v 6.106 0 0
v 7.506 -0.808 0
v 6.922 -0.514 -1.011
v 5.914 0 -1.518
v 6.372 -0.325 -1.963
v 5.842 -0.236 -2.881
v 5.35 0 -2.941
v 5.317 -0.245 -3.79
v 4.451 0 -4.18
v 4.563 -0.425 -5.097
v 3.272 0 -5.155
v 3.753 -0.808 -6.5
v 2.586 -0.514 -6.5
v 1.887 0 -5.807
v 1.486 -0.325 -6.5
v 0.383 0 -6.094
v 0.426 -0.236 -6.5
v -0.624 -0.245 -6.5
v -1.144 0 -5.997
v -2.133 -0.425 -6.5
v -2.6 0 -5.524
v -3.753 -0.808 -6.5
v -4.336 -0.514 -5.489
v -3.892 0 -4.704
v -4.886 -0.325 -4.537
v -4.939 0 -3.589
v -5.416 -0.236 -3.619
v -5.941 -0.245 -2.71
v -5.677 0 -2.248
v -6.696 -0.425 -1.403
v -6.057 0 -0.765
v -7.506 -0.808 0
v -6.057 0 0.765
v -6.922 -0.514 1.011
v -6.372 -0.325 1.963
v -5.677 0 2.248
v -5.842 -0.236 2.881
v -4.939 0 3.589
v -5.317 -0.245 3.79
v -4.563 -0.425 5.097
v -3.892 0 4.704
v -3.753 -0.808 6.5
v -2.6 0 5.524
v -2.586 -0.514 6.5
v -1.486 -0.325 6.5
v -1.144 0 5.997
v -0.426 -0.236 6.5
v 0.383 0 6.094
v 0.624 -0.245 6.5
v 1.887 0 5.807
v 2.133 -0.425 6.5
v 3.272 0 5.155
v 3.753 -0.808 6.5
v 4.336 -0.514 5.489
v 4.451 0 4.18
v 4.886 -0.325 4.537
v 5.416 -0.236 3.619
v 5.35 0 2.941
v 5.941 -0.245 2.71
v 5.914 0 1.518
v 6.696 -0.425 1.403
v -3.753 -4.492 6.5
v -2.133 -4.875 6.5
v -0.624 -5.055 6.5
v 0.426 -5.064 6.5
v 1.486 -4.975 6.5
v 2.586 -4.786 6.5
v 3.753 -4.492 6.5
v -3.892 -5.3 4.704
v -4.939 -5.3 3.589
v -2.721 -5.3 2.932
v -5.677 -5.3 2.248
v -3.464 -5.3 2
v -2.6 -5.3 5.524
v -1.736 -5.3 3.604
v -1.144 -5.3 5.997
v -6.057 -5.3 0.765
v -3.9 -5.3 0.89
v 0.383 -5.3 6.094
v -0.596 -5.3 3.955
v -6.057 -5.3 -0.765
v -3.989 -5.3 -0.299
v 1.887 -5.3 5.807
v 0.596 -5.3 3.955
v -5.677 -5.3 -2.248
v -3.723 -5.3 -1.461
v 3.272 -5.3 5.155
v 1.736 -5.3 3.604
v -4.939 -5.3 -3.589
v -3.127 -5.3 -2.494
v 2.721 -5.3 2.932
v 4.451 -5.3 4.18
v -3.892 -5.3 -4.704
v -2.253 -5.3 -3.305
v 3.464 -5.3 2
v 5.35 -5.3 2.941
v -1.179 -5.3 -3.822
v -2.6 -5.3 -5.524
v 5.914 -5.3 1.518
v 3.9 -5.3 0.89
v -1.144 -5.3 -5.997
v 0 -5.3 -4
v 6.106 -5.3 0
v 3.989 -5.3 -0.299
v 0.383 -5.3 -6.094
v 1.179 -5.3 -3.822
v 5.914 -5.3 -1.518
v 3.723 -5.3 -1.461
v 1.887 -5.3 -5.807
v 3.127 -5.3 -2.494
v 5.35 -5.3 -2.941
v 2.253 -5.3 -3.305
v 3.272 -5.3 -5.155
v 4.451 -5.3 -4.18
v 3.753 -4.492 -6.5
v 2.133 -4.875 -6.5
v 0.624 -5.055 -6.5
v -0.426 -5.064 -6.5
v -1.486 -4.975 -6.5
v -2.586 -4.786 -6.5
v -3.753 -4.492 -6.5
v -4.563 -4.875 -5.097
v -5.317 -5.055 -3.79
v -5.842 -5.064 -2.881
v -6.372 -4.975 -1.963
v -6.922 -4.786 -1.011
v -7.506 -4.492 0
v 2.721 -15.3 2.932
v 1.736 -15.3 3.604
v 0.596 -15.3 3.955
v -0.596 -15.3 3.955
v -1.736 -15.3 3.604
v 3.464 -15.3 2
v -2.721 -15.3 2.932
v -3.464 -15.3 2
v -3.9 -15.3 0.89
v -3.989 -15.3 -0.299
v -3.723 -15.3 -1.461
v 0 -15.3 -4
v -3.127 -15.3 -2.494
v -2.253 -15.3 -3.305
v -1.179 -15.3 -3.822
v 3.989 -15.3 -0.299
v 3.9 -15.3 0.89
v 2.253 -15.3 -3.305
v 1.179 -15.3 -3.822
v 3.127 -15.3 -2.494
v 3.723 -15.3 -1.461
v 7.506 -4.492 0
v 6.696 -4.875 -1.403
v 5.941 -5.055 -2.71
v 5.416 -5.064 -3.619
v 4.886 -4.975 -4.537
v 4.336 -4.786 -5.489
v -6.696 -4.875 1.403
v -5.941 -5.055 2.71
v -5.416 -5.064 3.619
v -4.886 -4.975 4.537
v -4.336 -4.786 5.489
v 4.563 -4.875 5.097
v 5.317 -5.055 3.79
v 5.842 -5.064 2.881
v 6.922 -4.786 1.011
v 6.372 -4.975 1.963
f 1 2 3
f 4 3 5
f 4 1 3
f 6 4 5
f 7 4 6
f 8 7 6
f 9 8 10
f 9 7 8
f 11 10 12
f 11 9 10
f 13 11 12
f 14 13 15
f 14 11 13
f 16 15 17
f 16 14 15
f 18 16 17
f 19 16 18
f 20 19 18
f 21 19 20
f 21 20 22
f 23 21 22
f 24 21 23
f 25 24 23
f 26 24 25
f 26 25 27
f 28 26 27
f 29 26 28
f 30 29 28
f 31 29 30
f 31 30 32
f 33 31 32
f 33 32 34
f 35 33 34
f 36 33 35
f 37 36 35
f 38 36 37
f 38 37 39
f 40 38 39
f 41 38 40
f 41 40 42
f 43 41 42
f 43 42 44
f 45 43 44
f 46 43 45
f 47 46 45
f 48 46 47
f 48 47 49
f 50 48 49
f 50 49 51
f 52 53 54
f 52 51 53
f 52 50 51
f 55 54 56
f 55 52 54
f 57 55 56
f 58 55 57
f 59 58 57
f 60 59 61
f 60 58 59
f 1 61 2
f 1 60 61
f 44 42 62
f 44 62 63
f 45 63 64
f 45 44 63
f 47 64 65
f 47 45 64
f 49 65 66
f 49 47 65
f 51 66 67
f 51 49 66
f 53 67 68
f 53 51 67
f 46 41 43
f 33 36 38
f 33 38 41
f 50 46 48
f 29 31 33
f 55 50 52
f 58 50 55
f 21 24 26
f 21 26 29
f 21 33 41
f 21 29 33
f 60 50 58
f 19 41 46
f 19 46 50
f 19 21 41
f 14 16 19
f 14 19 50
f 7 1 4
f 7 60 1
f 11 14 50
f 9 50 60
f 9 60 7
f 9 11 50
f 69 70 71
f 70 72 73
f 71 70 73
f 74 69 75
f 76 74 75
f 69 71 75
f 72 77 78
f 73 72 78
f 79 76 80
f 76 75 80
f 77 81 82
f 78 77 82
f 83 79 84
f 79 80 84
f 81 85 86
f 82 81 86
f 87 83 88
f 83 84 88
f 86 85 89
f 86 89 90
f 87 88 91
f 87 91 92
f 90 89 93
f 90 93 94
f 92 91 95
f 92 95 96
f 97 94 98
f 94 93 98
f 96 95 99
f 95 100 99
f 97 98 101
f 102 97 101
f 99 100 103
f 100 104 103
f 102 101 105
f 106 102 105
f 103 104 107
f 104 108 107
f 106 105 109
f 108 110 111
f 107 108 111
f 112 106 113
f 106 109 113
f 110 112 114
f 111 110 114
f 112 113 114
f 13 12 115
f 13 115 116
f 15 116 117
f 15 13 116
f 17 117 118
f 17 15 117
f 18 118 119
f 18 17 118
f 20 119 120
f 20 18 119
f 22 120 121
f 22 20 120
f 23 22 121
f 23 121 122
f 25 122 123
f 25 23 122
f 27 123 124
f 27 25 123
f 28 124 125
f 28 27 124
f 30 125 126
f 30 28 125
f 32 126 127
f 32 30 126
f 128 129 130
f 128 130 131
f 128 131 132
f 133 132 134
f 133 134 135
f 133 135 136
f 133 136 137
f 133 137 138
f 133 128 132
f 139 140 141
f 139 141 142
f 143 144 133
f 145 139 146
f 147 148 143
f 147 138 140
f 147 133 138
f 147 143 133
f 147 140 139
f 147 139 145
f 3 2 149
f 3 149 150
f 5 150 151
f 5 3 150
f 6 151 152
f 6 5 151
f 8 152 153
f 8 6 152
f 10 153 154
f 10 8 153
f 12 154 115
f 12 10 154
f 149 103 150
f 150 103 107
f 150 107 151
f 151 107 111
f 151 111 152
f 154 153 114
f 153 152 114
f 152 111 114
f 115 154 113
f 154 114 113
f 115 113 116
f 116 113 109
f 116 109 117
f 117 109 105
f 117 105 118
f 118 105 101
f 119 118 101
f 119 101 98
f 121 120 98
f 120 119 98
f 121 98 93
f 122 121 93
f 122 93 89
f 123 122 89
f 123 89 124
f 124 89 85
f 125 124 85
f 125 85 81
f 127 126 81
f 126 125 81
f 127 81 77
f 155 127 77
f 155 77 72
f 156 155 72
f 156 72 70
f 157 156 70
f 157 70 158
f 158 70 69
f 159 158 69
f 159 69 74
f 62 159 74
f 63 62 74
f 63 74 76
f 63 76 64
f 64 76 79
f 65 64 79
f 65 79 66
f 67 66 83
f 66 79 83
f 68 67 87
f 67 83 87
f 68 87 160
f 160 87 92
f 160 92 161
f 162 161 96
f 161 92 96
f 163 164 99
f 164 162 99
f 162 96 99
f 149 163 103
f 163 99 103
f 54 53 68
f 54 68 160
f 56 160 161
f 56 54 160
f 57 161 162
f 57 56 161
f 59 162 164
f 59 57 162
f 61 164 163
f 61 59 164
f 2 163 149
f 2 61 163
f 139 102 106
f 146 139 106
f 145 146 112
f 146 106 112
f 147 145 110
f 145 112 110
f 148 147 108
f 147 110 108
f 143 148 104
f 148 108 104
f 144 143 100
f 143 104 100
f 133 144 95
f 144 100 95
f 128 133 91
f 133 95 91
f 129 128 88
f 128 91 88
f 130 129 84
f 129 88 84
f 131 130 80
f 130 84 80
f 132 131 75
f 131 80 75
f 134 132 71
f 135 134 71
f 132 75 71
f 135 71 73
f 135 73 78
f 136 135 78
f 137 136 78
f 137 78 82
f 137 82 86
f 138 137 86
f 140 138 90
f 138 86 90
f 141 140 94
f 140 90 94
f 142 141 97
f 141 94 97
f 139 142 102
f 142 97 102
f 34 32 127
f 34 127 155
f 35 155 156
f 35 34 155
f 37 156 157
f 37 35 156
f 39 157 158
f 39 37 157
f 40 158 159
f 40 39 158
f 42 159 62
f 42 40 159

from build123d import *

# Parameters (mm, degrees)
EXTRUDE1_DEPTH = 5.3
SKETCH2_R      = 4
EXTRUDE2_DEPTH = 10


with BuildPart() as part:
    # Sketch1 → Extrude1 (new body)
    with BuildSketch(Plane(origin=(0, 0, 0), x_dir=(1, 0, 0), z_dir=(0, 1, 0))):
        Polygon((7.505553499, 0), (3.75277675, 6.5), (-3.75277675, 6.5), (-7.505553499, 0), (-3.75277675, -6.5), (3.75277675, -6.5), align=None)
    extrude(amount=-EXTRUDE1_DEPTH)

    # Sketch2 → Extrude2 (add)
    with BuildSketch(Plane.XZ.offset(5.3)):
        with Locations(Location((0, 0, 0), (0, 0, 270))):
            Circle(SKETCH2_R)
    extrude(amount=EXTRUDE2_DEPTH)

    # Sketch3 → Cut-Revolve1 (revolve, cut)
    with BuildSketch(Plane.XY):
        Polygon((6.105553499, 0), (7.505553499, 0), (7.505553499, -0.808290377), align=None)
        Polygon((7.505553499, -5.3), (7.505553499, -4.491709623), (6.105553499, -5.3), align=None)
    revolve(axis=Axis((0, -1000, 0), (0, 1, 0)), mode=Mode.SUBTRACT)


solid = part.part
